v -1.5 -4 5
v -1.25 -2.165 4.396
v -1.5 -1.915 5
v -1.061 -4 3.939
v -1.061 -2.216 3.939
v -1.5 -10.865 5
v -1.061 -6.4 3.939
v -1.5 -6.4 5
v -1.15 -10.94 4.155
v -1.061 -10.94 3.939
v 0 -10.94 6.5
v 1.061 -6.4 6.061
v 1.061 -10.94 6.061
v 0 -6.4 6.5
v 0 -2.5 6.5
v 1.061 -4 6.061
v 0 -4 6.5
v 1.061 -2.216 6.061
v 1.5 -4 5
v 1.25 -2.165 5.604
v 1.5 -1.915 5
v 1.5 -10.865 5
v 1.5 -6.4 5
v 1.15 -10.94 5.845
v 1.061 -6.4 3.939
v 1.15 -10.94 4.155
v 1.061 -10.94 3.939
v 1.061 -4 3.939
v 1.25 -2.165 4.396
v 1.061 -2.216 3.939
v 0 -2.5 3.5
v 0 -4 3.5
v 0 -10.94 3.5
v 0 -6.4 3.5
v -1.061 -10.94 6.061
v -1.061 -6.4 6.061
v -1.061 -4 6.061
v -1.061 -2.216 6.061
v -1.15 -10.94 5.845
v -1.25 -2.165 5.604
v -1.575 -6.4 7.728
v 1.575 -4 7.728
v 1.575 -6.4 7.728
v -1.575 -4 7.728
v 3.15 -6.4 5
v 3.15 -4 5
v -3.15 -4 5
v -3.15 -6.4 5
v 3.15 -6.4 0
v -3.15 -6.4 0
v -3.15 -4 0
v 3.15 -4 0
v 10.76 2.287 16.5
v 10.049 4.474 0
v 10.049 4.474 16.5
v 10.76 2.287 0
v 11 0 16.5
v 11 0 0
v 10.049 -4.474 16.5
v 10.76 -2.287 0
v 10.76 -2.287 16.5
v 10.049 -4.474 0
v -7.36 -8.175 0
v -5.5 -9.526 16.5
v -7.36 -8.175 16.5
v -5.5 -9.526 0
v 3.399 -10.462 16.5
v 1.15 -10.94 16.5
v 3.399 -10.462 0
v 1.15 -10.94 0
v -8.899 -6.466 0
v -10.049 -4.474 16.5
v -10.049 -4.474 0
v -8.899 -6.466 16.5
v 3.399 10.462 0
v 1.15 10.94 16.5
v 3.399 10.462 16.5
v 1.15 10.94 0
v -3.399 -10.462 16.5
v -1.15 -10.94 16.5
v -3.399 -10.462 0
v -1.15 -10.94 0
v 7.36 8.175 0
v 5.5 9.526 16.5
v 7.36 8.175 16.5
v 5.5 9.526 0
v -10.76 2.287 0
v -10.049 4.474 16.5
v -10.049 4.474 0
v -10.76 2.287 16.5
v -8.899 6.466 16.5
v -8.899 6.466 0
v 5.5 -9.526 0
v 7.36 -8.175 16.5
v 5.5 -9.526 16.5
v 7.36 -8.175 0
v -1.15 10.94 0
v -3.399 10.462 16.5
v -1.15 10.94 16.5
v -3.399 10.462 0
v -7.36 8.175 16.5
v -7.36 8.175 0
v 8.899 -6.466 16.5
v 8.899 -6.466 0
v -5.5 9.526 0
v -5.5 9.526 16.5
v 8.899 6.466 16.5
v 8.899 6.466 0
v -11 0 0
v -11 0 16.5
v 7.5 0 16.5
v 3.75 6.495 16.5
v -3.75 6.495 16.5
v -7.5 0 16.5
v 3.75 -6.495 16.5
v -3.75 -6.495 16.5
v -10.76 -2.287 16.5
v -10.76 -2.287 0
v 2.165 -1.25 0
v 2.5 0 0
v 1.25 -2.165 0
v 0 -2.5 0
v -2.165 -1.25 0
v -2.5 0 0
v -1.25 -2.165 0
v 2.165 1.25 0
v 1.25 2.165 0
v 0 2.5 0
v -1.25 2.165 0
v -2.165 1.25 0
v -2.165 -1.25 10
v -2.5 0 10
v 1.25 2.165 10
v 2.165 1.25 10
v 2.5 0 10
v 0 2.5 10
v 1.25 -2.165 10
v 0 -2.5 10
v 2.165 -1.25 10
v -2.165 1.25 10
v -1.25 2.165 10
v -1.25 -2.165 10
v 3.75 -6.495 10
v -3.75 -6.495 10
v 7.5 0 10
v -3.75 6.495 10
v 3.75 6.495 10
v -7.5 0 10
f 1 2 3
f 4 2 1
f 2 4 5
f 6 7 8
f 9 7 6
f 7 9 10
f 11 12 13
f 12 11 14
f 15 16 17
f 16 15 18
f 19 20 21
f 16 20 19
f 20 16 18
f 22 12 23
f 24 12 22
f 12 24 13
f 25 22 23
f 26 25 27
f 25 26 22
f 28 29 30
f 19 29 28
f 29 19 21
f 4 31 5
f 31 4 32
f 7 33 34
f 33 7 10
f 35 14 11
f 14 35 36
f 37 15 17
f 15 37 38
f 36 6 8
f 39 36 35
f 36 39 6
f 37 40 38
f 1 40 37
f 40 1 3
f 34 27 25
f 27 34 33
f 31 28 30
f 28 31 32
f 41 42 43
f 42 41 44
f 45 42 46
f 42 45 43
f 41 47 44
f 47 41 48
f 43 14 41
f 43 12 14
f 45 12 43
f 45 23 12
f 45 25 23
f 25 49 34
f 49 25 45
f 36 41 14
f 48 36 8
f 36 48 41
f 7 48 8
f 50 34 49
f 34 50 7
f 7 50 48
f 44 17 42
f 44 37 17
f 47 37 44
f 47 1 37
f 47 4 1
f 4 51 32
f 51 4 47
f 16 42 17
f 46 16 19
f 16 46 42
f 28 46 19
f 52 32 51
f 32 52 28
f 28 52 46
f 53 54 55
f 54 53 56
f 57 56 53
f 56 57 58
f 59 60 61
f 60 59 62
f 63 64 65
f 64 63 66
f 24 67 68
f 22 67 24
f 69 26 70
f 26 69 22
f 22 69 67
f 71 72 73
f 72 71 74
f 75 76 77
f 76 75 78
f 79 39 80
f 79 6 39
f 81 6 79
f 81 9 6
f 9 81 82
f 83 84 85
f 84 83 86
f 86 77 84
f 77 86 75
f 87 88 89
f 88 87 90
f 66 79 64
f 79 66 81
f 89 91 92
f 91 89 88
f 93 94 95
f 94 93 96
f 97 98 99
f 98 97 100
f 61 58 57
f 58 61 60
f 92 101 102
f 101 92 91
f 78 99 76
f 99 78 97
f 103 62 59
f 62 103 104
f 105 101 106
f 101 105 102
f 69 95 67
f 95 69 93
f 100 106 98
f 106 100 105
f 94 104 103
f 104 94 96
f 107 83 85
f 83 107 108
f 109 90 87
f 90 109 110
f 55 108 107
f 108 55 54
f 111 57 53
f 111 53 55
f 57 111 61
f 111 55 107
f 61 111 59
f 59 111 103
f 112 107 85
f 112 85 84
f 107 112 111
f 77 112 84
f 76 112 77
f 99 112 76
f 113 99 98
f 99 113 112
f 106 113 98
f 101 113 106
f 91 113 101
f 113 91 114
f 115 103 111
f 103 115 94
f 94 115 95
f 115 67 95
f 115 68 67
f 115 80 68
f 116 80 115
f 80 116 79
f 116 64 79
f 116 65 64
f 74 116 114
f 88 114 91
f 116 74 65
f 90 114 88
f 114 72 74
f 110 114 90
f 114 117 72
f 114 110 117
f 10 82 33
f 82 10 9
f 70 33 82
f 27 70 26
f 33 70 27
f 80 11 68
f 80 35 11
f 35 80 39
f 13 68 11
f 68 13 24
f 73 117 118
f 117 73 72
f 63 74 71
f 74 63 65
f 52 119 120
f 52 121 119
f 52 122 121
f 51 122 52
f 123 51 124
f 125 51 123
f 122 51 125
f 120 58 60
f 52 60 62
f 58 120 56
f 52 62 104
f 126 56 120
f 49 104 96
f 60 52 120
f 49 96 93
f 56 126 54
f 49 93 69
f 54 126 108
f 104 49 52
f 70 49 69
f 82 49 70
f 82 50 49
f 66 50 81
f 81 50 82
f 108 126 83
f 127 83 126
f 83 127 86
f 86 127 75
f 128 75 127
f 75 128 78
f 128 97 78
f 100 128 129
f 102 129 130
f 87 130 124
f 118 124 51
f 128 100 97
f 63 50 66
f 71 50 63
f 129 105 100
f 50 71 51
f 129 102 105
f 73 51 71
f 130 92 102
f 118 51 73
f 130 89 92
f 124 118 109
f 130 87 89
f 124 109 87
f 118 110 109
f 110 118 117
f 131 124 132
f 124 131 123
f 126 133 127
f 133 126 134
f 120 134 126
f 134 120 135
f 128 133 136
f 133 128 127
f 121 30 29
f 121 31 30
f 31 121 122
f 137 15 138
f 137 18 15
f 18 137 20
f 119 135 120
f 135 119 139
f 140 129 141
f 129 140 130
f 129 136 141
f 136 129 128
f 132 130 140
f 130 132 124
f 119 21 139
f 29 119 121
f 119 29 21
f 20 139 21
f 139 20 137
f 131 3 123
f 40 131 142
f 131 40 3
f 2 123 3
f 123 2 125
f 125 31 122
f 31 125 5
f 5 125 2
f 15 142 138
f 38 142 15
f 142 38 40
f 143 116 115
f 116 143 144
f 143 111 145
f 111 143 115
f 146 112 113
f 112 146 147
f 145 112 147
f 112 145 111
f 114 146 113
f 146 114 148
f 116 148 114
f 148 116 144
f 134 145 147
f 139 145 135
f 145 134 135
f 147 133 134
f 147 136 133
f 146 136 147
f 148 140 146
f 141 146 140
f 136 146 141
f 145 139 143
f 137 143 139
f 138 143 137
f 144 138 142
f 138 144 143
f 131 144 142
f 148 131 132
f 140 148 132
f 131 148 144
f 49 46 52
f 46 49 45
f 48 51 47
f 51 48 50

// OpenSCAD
nut_width = 6.5;

difference() {
cylinder( r = 11, h = 10 + nut_width );
translate( [0,0,-1] ) cylinder( r = 2.5, h = 12, $fn = 12 );
translate( [0,0,10] ) cylinder( r = nut_width + 1, h = 7, $fn = 6 );
translate( [0,0,5] )
rotate( [90,0,0 ] ) {
   translate( [0,0,1] ) cylinder( r = 1.5, h = 12, $fn = 8 );
   translate( [0,0,4] ) cylinder( r = 3.15, h = 2.4, $fn = 6 );
}
translate( [-3.15,-2.4 - 4,-1] ) cube( size= [6.3, 2.4,6] );
}
